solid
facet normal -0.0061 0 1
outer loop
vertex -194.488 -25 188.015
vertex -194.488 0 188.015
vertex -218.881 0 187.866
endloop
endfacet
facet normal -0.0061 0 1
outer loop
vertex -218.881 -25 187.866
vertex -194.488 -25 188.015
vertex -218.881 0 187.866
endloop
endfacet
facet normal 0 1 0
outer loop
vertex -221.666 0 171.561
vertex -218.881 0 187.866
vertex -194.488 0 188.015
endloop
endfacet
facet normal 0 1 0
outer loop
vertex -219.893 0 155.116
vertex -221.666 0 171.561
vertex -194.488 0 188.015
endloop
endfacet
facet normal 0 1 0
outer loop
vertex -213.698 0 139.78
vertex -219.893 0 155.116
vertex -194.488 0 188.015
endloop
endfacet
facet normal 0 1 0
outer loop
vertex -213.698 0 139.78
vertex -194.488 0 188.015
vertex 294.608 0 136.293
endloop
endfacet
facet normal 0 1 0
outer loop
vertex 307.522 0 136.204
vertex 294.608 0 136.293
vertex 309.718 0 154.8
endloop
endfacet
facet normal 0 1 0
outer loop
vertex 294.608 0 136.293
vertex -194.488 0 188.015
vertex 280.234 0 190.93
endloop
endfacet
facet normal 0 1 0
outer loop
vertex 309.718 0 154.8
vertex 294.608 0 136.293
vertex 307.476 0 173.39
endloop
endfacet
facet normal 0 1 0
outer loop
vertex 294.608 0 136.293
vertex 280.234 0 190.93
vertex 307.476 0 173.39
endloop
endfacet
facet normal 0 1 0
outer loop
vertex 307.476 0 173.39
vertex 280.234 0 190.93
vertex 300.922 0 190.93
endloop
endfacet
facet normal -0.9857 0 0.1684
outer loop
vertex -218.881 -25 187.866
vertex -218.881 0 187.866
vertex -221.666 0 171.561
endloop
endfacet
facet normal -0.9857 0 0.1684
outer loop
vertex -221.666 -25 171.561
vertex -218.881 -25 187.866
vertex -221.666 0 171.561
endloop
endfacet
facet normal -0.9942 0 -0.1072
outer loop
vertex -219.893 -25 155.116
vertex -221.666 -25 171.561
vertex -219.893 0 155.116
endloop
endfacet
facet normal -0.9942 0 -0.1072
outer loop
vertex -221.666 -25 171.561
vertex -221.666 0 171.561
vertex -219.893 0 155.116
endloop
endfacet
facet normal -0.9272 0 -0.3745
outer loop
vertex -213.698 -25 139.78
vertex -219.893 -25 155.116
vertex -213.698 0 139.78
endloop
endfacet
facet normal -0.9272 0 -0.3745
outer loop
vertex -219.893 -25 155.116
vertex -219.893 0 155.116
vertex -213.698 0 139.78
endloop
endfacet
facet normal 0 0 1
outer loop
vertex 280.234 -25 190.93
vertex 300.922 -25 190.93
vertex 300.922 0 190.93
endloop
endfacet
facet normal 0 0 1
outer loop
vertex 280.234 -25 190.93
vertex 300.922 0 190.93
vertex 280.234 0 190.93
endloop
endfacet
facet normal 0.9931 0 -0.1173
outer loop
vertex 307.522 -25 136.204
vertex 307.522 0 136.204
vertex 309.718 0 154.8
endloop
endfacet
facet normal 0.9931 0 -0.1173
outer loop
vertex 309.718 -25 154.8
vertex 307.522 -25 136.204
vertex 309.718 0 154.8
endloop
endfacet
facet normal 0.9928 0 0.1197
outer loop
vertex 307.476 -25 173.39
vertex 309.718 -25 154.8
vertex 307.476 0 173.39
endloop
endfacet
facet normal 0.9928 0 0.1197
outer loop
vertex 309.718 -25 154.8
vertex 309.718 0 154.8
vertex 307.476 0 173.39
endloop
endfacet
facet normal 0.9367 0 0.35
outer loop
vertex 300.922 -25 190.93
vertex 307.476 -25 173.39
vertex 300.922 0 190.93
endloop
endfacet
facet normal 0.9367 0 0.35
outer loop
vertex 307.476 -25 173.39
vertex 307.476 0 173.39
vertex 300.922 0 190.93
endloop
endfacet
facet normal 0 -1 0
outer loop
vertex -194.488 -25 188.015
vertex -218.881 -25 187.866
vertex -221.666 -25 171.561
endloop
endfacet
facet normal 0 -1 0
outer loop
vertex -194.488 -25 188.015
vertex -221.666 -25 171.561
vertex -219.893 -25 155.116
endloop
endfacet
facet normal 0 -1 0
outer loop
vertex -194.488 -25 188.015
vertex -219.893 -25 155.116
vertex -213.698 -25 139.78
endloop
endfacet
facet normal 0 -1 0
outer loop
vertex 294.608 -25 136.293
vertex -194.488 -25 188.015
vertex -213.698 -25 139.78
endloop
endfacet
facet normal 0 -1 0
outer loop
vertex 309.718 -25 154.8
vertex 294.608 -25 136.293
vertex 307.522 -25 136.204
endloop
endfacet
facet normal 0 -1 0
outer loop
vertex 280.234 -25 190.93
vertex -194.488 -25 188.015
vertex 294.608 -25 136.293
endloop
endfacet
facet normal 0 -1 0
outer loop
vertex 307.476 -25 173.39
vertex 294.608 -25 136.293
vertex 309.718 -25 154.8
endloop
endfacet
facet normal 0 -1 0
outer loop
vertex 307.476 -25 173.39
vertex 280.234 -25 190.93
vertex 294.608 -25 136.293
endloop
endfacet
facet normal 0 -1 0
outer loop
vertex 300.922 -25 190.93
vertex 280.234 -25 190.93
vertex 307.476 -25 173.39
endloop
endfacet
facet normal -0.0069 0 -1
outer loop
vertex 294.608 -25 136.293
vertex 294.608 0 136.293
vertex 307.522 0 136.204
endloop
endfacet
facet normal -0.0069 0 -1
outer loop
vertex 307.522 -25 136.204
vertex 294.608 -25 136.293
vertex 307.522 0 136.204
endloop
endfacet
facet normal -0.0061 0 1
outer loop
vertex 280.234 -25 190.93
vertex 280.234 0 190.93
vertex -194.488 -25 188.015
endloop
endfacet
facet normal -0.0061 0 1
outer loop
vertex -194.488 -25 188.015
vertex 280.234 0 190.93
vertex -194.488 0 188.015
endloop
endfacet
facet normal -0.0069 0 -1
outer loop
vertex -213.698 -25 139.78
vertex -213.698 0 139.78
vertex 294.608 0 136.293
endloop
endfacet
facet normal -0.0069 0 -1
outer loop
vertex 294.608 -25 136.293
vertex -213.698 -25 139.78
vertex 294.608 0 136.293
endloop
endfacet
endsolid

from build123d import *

# Parameters (mm, degrees)
F2_DEPTH = 25


with BuildPart() as f2:
    # F1 (on face) → F2 (new body)
    with BuildSketch(Plane.XZ):
        with BuildLine():
            ThreePointArc((307.522314, 136.204265), (309.150117, 164.161267), (300.922203, 190.929627))
            Line((300.922203, 190.929627), (299.40453, 190.929627))
            Line((299.40453, 190.929627), (280.23421, 190.929627))
            Line((280.23421, 190.929627), (-194.487512, 188.015388))
            Line((-194.487512, 188.015388), (-218.880566, 187.865643))
            ThreePointArc((-218.880566, 187.865643), (-221.348908, 163.277257), (-213.697833, 139.779545))
            Line((-213.697833, 139.779545), (294.608427, 136.292847))
            Line((294.608427, 136.292847), (307.522314, 136.204265))
        make_face()
    extrude(amount=F2_DEPTH)


solid = f2.part
